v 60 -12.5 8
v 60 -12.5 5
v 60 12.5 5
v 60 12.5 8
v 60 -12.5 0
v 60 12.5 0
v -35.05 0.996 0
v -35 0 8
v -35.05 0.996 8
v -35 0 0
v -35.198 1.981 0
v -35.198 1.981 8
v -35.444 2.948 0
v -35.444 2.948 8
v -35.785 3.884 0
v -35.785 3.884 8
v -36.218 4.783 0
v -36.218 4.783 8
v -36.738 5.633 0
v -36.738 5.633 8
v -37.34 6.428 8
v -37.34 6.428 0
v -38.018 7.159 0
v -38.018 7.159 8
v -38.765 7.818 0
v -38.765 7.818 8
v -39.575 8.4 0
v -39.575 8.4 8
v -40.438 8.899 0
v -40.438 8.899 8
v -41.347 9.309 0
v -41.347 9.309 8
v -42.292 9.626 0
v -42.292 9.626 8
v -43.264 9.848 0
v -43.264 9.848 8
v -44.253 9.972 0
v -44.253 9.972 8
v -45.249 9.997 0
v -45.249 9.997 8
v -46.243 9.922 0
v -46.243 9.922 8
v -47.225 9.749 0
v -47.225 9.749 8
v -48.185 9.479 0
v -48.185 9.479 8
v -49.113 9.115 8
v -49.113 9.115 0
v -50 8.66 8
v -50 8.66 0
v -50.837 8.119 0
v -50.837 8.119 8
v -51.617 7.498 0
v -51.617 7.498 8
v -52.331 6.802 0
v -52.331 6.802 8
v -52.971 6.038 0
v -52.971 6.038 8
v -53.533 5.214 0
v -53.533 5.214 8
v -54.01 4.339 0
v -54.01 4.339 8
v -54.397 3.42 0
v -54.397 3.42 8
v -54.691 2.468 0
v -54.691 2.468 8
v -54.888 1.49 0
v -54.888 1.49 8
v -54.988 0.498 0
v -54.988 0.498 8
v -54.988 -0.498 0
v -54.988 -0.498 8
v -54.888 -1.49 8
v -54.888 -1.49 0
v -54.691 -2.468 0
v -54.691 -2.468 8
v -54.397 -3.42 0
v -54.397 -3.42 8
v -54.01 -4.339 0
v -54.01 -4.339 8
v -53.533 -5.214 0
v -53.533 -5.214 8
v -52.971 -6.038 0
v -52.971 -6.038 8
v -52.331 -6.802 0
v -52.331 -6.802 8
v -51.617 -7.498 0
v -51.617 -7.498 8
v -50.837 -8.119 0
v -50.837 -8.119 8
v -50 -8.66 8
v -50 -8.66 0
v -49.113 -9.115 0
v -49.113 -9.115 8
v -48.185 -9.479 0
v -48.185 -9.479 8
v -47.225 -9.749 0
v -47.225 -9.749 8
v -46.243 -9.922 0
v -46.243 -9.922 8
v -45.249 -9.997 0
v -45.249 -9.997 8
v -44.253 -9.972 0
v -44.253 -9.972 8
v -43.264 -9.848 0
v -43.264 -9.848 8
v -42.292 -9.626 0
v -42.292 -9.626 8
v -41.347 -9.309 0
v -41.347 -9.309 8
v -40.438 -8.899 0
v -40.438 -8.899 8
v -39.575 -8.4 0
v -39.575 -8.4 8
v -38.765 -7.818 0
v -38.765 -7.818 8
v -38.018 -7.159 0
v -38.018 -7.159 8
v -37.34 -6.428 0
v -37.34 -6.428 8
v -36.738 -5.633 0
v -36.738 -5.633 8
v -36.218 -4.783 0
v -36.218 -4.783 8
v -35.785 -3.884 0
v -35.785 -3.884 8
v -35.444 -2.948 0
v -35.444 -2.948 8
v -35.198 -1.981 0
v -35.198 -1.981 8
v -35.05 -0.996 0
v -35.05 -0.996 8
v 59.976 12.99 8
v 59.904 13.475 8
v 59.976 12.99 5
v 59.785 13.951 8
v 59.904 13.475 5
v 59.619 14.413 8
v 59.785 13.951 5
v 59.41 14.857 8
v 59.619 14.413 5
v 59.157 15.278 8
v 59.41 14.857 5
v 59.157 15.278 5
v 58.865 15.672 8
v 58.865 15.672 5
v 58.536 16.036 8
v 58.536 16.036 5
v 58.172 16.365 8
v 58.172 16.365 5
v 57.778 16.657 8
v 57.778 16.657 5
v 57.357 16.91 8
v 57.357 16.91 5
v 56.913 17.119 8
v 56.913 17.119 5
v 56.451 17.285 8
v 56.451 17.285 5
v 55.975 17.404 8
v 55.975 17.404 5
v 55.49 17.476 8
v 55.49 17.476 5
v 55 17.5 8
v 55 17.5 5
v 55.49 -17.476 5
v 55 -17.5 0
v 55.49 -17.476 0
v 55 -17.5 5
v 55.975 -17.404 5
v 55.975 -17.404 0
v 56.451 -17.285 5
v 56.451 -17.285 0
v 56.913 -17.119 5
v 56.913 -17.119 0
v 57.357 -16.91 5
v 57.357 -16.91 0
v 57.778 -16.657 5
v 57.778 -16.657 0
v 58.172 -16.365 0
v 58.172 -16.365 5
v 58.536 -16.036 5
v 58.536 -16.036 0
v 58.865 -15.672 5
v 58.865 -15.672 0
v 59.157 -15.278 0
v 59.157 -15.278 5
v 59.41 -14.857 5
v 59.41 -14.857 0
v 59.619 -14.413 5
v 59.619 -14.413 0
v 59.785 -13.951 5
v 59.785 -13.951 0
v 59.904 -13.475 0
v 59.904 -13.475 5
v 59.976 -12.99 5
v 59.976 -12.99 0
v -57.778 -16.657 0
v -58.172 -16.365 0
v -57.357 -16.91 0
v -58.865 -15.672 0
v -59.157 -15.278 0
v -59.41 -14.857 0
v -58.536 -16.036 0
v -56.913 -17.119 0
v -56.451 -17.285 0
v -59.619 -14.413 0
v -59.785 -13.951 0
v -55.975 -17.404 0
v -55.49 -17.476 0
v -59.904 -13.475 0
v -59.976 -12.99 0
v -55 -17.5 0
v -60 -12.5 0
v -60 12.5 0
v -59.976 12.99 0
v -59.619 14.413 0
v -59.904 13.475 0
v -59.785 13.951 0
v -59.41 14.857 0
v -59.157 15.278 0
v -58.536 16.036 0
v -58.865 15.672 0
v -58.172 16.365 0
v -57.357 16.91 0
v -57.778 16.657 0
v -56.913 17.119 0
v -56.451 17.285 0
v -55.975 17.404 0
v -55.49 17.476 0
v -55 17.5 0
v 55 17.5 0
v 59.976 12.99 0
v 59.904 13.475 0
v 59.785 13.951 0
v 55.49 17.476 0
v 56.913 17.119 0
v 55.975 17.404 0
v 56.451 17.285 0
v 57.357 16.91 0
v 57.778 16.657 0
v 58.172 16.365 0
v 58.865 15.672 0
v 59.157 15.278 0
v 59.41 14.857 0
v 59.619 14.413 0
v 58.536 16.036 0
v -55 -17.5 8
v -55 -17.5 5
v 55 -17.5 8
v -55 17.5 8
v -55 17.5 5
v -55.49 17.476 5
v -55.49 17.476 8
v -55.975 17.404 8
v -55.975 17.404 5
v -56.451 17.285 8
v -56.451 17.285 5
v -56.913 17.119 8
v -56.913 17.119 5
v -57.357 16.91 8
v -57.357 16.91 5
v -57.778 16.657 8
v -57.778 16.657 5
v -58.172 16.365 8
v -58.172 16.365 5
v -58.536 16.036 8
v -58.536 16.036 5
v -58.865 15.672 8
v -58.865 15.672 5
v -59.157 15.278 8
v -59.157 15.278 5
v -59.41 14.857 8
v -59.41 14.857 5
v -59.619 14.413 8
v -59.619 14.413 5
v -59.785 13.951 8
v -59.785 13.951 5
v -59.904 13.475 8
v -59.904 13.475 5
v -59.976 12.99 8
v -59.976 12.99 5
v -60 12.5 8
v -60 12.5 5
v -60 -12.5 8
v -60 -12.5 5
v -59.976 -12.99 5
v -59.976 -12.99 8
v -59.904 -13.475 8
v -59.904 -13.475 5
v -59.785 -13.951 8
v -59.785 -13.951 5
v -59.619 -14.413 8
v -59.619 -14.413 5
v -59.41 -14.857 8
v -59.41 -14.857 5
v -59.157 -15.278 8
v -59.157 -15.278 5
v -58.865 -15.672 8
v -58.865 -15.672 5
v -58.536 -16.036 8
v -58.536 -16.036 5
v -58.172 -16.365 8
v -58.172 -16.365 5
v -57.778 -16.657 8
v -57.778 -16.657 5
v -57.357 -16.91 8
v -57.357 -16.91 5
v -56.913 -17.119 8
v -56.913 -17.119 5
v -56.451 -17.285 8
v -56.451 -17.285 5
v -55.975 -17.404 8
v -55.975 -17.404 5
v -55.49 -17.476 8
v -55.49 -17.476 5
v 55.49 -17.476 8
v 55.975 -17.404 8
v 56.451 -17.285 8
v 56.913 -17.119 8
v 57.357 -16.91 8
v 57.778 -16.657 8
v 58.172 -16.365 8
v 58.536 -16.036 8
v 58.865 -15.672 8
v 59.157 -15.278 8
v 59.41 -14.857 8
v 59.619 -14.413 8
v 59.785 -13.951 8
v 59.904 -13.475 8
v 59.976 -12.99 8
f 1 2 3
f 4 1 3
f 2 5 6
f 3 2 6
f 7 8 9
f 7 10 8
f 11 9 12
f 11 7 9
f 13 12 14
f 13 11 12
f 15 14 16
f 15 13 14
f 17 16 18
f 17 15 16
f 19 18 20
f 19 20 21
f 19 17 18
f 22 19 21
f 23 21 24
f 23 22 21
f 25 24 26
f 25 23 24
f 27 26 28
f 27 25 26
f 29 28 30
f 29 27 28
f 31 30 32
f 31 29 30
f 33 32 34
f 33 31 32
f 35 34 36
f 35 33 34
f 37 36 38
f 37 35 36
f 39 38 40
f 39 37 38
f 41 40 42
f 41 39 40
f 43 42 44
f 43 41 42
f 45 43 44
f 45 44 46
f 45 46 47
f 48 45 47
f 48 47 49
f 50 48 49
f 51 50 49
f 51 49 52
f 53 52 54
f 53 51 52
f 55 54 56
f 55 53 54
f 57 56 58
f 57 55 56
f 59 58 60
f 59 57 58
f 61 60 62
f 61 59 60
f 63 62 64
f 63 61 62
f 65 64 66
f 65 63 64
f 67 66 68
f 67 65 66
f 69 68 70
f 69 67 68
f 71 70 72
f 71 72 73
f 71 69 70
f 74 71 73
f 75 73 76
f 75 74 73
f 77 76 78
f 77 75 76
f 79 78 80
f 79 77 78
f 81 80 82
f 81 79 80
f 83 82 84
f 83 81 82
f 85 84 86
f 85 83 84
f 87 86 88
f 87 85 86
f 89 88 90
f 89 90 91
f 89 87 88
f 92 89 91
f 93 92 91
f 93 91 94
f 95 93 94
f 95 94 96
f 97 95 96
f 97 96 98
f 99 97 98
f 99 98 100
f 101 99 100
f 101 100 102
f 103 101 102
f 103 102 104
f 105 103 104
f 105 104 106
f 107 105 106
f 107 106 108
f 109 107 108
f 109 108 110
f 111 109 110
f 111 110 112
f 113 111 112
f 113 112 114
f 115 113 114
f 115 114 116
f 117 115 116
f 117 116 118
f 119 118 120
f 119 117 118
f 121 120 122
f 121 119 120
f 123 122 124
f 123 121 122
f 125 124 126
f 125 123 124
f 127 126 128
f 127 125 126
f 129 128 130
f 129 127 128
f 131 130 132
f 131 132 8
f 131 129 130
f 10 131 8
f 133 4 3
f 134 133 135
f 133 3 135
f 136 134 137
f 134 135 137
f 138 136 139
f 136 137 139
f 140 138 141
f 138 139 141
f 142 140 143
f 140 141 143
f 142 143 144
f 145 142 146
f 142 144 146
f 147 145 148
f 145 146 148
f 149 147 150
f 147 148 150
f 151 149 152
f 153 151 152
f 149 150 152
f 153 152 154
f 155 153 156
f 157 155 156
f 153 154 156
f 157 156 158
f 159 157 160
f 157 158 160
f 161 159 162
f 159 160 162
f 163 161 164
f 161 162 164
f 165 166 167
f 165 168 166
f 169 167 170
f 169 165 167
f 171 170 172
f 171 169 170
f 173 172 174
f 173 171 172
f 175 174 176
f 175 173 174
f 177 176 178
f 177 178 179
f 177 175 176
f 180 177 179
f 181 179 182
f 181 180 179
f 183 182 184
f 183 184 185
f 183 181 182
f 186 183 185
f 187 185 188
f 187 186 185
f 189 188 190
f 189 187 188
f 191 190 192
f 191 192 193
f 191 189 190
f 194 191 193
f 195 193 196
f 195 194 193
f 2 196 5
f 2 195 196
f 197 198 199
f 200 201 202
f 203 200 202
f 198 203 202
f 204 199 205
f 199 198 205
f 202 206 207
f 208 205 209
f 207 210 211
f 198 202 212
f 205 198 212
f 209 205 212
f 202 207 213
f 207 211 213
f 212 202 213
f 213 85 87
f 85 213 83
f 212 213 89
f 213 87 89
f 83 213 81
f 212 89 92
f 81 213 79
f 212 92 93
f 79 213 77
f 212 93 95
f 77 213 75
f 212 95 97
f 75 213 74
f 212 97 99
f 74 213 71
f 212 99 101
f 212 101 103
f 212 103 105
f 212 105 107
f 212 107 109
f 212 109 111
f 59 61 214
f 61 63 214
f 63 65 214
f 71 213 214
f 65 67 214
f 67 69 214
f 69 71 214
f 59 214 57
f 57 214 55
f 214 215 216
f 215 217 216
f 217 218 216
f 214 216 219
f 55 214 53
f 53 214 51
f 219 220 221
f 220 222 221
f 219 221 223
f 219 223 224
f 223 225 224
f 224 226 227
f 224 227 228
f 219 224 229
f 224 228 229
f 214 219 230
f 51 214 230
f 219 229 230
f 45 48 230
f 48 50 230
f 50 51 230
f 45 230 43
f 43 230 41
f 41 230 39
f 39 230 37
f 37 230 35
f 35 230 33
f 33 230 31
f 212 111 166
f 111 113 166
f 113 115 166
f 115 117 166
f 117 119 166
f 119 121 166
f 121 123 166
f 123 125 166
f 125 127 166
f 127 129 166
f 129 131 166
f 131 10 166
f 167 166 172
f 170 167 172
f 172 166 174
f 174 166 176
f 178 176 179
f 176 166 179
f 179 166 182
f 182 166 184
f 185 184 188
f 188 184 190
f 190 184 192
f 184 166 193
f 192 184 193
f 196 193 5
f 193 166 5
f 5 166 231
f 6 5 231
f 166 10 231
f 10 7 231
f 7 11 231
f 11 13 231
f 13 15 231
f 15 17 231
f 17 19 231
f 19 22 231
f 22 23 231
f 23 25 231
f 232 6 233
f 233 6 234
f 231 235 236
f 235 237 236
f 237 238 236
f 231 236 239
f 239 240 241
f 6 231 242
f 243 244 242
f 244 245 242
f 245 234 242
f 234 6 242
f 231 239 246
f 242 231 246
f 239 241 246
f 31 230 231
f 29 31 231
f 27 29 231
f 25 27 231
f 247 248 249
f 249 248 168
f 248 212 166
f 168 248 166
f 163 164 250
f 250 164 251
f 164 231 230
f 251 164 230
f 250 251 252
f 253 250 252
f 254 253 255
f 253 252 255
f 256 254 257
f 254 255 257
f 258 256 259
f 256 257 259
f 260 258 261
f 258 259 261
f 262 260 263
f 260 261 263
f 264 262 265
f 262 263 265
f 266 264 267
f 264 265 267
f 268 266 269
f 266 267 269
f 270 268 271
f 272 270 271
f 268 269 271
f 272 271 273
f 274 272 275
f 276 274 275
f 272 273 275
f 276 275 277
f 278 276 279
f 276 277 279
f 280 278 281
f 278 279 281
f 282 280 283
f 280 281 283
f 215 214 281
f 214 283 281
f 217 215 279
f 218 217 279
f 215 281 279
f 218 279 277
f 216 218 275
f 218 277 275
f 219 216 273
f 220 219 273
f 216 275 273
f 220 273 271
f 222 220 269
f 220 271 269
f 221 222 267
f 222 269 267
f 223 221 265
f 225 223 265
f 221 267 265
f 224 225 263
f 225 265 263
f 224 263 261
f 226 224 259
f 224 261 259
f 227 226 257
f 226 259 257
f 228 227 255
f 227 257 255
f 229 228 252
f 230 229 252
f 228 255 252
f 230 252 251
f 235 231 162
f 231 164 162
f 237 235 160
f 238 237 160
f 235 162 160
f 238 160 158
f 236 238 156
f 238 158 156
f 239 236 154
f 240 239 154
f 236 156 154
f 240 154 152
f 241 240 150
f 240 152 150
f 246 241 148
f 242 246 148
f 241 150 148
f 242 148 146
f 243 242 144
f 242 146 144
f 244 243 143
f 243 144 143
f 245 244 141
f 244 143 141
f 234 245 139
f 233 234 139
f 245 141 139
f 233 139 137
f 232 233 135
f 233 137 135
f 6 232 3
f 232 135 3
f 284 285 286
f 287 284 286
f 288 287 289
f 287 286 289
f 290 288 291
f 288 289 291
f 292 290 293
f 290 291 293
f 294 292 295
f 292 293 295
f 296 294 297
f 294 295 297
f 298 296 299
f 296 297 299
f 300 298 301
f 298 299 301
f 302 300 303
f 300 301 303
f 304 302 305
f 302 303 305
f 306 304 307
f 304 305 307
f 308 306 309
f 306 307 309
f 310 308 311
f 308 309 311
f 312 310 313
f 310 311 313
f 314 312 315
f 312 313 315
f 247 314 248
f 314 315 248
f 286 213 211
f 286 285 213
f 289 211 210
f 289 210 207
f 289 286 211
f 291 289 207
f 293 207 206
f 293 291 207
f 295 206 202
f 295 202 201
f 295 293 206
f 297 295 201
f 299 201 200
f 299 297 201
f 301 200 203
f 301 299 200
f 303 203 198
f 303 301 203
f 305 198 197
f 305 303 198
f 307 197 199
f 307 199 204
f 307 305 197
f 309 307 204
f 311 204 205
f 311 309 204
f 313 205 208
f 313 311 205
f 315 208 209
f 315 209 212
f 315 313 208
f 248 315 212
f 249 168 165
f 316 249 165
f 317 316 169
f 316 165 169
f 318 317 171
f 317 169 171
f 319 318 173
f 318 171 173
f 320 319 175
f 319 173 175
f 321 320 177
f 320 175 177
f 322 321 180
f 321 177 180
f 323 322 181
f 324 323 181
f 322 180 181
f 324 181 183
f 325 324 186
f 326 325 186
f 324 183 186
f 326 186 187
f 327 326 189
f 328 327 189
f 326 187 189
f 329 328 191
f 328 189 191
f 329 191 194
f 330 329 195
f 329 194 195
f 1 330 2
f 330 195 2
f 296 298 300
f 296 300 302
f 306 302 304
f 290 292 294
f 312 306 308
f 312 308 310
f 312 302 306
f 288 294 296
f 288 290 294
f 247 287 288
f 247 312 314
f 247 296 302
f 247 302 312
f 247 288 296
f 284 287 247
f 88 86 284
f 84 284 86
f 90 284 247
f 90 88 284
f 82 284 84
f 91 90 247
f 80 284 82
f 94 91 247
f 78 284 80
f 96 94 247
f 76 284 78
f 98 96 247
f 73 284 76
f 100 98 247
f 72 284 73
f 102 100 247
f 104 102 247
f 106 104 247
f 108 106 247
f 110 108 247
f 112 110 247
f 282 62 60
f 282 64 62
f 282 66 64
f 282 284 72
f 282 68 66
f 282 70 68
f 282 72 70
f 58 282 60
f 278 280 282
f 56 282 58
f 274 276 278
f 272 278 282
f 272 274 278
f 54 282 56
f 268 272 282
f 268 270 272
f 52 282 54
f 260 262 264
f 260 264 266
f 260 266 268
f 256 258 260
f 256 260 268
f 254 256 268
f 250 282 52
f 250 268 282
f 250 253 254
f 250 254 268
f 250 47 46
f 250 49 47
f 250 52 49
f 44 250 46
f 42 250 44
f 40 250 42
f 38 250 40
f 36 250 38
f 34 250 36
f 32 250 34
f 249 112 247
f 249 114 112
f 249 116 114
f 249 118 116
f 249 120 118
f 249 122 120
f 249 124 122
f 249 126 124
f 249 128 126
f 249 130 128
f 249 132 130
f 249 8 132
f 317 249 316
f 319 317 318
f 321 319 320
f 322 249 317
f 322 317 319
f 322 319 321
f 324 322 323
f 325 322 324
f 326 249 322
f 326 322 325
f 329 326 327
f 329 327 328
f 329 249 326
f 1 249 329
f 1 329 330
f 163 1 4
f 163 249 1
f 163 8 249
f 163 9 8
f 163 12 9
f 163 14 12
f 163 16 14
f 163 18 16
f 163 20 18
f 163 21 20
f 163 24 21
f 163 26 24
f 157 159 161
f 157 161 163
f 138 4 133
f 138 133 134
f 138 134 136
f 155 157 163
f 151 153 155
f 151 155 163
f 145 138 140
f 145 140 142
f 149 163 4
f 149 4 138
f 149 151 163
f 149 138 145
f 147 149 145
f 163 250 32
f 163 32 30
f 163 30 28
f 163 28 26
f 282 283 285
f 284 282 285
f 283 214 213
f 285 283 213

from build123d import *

# Parameters (mm, degrees)
F0_W      = 120
F0_H      = 35
F0_R      = 10
F1_DEPTH  = 5
F2_R      = 5
F1_FACE_R = 10
F3_DEPTH  = 3


with BuildPart() as f1:
    # F0 (on Top) → F1 (new body)
    with BuildSketch(Plane.XY):
        Rectangle(F0_W, F0_H)
        with Locations((-45, 0)):
            Circle(F0_R, mode=Mode.SUBTRACT)
    extrude(amount=F1_DEPTH)

    # F2
    f2_edges = [f1.edges().sort_by_distance(p)[0] for p in [
        (-60, -17.5, 2.5),
        (-60, 17.5, 2.5),
        (60, 17.5, 2.5),
        (60, -17.5, 2.5),
    ]]
    fillet(f2_edges, radius=F2_R)

    # F1_face (on face) → F3 (join)
    with BuildSketch(Plane(origin=(3.658327, 0, 5), x_dir=(1, 0, 0), z_dir=(0, 0, 1))):
        with BuildLine():
            Line((-63.658327, 12.5), (-63.658327, -12.5))
            ThreePointArc((-63.658327, -12.5), (-62.193861, -16.035534), (-58.658327, -17.5))
            Line((-58.658327, -17.5), (51.341673, -17.5))
            ThreePointArc((51.341673, -17.5), (54.877207, -16.035534), (56.341673, -12.5))
            Line((56.341673, -12.5), (56.341673, 12.5))
            ThreePointArc((56.341673, 12.5), (54.877207, 16.035534), (51.341673, 17.5))
            Line((51.341673, 17.5), (-58.658327, 17.5))
            ThreePointArc((-58.658327, 17.5), (-62.193861, 16.035534), (-63.658327, 12.5))
        make_face()
        with Locations((-48.658327, 0)):
            Circle(F1_FACE_R, mode=Mode.SUBTRACT)
    extrude(amount=F3_DEPTH)


solid = f1.part
